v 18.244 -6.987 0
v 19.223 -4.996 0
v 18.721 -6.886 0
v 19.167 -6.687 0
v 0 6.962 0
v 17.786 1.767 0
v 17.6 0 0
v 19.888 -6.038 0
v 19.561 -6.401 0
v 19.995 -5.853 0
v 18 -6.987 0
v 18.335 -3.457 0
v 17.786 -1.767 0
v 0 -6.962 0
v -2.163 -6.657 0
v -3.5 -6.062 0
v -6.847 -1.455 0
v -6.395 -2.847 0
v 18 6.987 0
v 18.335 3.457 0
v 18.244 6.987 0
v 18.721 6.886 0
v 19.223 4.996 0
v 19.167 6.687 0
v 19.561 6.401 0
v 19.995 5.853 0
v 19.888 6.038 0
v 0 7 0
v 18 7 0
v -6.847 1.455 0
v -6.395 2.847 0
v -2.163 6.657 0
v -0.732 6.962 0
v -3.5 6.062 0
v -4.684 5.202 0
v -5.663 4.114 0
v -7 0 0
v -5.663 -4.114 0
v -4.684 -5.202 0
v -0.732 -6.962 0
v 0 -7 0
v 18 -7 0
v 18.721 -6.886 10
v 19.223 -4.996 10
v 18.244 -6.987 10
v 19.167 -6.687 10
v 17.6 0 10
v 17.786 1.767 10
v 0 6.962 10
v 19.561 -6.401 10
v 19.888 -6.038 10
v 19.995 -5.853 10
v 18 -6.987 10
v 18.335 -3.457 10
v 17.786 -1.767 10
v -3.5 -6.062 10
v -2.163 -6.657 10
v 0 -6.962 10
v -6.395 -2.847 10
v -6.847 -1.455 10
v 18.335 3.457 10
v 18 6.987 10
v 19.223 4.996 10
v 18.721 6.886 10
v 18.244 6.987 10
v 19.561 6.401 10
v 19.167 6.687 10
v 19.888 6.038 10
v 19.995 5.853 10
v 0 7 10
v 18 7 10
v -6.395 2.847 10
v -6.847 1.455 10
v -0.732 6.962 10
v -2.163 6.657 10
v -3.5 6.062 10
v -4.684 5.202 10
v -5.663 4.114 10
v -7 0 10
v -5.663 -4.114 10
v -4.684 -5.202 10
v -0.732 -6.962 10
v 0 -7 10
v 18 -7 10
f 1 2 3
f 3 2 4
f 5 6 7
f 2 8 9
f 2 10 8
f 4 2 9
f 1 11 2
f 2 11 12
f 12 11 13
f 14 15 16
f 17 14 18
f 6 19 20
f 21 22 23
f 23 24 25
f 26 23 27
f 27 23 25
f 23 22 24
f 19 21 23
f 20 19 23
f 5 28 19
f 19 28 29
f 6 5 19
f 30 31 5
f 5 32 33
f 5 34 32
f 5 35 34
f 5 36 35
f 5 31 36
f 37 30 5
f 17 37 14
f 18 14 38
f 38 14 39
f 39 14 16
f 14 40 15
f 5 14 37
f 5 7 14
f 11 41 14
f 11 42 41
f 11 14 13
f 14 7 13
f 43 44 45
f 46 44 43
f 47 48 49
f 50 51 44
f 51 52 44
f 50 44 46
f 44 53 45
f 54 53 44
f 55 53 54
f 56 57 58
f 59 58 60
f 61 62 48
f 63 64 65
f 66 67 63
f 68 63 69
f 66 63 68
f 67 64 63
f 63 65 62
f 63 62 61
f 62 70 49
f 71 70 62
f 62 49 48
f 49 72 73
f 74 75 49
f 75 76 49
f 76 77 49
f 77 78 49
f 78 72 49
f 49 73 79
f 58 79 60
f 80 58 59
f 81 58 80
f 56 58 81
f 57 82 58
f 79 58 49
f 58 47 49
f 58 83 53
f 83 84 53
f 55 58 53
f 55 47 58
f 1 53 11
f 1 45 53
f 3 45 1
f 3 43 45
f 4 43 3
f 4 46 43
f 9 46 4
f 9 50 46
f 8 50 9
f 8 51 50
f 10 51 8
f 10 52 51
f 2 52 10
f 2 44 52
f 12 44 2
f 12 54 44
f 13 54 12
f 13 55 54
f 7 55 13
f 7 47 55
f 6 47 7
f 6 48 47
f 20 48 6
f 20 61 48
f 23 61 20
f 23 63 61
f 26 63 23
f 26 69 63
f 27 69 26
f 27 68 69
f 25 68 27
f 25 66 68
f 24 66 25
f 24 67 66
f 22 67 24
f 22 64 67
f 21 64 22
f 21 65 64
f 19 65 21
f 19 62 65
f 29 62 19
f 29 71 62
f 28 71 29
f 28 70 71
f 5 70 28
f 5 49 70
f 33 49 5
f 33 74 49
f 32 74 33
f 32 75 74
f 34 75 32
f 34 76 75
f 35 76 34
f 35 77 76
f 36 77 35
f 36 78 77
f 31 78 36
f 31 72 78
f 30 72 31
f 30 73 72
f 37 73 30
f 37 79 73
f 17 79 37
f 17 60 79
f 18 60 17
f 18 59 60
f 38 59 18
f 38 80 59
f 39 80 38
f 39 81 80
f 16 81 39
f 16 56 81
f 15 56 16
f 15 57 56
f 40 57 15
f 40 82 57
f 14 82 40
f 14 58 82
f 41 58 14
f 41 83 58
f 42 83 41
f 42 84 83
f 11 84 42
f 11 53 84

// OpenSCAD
$fn=30;
fingerWidth=14;
miniOuterCircleD = fingerWidth/3;
fingerPadLength=18;
linear_extrude(10){
    difference(){
        union(){
            translate([fingerPadLength/2,0,0])
            square([fingerPadLength,fingerWidth], center = true);
            circle(d=fingerWidth);
            translate([fingerPadLength,fingerWidth/2-miniOuterCircleD/2,0])
            circle(d=miniOuterCircleD);
            translate([fingerPadLength,-fingerWidth/2+miniOuterCircleD/2,0])
            circle(d=miniOuterCircleD); 
        }
        translate([fingerPadLength+((fingerPadLength*4.5)/10),0,0])
        circle(d=fingerWidth+3);
    }
}
